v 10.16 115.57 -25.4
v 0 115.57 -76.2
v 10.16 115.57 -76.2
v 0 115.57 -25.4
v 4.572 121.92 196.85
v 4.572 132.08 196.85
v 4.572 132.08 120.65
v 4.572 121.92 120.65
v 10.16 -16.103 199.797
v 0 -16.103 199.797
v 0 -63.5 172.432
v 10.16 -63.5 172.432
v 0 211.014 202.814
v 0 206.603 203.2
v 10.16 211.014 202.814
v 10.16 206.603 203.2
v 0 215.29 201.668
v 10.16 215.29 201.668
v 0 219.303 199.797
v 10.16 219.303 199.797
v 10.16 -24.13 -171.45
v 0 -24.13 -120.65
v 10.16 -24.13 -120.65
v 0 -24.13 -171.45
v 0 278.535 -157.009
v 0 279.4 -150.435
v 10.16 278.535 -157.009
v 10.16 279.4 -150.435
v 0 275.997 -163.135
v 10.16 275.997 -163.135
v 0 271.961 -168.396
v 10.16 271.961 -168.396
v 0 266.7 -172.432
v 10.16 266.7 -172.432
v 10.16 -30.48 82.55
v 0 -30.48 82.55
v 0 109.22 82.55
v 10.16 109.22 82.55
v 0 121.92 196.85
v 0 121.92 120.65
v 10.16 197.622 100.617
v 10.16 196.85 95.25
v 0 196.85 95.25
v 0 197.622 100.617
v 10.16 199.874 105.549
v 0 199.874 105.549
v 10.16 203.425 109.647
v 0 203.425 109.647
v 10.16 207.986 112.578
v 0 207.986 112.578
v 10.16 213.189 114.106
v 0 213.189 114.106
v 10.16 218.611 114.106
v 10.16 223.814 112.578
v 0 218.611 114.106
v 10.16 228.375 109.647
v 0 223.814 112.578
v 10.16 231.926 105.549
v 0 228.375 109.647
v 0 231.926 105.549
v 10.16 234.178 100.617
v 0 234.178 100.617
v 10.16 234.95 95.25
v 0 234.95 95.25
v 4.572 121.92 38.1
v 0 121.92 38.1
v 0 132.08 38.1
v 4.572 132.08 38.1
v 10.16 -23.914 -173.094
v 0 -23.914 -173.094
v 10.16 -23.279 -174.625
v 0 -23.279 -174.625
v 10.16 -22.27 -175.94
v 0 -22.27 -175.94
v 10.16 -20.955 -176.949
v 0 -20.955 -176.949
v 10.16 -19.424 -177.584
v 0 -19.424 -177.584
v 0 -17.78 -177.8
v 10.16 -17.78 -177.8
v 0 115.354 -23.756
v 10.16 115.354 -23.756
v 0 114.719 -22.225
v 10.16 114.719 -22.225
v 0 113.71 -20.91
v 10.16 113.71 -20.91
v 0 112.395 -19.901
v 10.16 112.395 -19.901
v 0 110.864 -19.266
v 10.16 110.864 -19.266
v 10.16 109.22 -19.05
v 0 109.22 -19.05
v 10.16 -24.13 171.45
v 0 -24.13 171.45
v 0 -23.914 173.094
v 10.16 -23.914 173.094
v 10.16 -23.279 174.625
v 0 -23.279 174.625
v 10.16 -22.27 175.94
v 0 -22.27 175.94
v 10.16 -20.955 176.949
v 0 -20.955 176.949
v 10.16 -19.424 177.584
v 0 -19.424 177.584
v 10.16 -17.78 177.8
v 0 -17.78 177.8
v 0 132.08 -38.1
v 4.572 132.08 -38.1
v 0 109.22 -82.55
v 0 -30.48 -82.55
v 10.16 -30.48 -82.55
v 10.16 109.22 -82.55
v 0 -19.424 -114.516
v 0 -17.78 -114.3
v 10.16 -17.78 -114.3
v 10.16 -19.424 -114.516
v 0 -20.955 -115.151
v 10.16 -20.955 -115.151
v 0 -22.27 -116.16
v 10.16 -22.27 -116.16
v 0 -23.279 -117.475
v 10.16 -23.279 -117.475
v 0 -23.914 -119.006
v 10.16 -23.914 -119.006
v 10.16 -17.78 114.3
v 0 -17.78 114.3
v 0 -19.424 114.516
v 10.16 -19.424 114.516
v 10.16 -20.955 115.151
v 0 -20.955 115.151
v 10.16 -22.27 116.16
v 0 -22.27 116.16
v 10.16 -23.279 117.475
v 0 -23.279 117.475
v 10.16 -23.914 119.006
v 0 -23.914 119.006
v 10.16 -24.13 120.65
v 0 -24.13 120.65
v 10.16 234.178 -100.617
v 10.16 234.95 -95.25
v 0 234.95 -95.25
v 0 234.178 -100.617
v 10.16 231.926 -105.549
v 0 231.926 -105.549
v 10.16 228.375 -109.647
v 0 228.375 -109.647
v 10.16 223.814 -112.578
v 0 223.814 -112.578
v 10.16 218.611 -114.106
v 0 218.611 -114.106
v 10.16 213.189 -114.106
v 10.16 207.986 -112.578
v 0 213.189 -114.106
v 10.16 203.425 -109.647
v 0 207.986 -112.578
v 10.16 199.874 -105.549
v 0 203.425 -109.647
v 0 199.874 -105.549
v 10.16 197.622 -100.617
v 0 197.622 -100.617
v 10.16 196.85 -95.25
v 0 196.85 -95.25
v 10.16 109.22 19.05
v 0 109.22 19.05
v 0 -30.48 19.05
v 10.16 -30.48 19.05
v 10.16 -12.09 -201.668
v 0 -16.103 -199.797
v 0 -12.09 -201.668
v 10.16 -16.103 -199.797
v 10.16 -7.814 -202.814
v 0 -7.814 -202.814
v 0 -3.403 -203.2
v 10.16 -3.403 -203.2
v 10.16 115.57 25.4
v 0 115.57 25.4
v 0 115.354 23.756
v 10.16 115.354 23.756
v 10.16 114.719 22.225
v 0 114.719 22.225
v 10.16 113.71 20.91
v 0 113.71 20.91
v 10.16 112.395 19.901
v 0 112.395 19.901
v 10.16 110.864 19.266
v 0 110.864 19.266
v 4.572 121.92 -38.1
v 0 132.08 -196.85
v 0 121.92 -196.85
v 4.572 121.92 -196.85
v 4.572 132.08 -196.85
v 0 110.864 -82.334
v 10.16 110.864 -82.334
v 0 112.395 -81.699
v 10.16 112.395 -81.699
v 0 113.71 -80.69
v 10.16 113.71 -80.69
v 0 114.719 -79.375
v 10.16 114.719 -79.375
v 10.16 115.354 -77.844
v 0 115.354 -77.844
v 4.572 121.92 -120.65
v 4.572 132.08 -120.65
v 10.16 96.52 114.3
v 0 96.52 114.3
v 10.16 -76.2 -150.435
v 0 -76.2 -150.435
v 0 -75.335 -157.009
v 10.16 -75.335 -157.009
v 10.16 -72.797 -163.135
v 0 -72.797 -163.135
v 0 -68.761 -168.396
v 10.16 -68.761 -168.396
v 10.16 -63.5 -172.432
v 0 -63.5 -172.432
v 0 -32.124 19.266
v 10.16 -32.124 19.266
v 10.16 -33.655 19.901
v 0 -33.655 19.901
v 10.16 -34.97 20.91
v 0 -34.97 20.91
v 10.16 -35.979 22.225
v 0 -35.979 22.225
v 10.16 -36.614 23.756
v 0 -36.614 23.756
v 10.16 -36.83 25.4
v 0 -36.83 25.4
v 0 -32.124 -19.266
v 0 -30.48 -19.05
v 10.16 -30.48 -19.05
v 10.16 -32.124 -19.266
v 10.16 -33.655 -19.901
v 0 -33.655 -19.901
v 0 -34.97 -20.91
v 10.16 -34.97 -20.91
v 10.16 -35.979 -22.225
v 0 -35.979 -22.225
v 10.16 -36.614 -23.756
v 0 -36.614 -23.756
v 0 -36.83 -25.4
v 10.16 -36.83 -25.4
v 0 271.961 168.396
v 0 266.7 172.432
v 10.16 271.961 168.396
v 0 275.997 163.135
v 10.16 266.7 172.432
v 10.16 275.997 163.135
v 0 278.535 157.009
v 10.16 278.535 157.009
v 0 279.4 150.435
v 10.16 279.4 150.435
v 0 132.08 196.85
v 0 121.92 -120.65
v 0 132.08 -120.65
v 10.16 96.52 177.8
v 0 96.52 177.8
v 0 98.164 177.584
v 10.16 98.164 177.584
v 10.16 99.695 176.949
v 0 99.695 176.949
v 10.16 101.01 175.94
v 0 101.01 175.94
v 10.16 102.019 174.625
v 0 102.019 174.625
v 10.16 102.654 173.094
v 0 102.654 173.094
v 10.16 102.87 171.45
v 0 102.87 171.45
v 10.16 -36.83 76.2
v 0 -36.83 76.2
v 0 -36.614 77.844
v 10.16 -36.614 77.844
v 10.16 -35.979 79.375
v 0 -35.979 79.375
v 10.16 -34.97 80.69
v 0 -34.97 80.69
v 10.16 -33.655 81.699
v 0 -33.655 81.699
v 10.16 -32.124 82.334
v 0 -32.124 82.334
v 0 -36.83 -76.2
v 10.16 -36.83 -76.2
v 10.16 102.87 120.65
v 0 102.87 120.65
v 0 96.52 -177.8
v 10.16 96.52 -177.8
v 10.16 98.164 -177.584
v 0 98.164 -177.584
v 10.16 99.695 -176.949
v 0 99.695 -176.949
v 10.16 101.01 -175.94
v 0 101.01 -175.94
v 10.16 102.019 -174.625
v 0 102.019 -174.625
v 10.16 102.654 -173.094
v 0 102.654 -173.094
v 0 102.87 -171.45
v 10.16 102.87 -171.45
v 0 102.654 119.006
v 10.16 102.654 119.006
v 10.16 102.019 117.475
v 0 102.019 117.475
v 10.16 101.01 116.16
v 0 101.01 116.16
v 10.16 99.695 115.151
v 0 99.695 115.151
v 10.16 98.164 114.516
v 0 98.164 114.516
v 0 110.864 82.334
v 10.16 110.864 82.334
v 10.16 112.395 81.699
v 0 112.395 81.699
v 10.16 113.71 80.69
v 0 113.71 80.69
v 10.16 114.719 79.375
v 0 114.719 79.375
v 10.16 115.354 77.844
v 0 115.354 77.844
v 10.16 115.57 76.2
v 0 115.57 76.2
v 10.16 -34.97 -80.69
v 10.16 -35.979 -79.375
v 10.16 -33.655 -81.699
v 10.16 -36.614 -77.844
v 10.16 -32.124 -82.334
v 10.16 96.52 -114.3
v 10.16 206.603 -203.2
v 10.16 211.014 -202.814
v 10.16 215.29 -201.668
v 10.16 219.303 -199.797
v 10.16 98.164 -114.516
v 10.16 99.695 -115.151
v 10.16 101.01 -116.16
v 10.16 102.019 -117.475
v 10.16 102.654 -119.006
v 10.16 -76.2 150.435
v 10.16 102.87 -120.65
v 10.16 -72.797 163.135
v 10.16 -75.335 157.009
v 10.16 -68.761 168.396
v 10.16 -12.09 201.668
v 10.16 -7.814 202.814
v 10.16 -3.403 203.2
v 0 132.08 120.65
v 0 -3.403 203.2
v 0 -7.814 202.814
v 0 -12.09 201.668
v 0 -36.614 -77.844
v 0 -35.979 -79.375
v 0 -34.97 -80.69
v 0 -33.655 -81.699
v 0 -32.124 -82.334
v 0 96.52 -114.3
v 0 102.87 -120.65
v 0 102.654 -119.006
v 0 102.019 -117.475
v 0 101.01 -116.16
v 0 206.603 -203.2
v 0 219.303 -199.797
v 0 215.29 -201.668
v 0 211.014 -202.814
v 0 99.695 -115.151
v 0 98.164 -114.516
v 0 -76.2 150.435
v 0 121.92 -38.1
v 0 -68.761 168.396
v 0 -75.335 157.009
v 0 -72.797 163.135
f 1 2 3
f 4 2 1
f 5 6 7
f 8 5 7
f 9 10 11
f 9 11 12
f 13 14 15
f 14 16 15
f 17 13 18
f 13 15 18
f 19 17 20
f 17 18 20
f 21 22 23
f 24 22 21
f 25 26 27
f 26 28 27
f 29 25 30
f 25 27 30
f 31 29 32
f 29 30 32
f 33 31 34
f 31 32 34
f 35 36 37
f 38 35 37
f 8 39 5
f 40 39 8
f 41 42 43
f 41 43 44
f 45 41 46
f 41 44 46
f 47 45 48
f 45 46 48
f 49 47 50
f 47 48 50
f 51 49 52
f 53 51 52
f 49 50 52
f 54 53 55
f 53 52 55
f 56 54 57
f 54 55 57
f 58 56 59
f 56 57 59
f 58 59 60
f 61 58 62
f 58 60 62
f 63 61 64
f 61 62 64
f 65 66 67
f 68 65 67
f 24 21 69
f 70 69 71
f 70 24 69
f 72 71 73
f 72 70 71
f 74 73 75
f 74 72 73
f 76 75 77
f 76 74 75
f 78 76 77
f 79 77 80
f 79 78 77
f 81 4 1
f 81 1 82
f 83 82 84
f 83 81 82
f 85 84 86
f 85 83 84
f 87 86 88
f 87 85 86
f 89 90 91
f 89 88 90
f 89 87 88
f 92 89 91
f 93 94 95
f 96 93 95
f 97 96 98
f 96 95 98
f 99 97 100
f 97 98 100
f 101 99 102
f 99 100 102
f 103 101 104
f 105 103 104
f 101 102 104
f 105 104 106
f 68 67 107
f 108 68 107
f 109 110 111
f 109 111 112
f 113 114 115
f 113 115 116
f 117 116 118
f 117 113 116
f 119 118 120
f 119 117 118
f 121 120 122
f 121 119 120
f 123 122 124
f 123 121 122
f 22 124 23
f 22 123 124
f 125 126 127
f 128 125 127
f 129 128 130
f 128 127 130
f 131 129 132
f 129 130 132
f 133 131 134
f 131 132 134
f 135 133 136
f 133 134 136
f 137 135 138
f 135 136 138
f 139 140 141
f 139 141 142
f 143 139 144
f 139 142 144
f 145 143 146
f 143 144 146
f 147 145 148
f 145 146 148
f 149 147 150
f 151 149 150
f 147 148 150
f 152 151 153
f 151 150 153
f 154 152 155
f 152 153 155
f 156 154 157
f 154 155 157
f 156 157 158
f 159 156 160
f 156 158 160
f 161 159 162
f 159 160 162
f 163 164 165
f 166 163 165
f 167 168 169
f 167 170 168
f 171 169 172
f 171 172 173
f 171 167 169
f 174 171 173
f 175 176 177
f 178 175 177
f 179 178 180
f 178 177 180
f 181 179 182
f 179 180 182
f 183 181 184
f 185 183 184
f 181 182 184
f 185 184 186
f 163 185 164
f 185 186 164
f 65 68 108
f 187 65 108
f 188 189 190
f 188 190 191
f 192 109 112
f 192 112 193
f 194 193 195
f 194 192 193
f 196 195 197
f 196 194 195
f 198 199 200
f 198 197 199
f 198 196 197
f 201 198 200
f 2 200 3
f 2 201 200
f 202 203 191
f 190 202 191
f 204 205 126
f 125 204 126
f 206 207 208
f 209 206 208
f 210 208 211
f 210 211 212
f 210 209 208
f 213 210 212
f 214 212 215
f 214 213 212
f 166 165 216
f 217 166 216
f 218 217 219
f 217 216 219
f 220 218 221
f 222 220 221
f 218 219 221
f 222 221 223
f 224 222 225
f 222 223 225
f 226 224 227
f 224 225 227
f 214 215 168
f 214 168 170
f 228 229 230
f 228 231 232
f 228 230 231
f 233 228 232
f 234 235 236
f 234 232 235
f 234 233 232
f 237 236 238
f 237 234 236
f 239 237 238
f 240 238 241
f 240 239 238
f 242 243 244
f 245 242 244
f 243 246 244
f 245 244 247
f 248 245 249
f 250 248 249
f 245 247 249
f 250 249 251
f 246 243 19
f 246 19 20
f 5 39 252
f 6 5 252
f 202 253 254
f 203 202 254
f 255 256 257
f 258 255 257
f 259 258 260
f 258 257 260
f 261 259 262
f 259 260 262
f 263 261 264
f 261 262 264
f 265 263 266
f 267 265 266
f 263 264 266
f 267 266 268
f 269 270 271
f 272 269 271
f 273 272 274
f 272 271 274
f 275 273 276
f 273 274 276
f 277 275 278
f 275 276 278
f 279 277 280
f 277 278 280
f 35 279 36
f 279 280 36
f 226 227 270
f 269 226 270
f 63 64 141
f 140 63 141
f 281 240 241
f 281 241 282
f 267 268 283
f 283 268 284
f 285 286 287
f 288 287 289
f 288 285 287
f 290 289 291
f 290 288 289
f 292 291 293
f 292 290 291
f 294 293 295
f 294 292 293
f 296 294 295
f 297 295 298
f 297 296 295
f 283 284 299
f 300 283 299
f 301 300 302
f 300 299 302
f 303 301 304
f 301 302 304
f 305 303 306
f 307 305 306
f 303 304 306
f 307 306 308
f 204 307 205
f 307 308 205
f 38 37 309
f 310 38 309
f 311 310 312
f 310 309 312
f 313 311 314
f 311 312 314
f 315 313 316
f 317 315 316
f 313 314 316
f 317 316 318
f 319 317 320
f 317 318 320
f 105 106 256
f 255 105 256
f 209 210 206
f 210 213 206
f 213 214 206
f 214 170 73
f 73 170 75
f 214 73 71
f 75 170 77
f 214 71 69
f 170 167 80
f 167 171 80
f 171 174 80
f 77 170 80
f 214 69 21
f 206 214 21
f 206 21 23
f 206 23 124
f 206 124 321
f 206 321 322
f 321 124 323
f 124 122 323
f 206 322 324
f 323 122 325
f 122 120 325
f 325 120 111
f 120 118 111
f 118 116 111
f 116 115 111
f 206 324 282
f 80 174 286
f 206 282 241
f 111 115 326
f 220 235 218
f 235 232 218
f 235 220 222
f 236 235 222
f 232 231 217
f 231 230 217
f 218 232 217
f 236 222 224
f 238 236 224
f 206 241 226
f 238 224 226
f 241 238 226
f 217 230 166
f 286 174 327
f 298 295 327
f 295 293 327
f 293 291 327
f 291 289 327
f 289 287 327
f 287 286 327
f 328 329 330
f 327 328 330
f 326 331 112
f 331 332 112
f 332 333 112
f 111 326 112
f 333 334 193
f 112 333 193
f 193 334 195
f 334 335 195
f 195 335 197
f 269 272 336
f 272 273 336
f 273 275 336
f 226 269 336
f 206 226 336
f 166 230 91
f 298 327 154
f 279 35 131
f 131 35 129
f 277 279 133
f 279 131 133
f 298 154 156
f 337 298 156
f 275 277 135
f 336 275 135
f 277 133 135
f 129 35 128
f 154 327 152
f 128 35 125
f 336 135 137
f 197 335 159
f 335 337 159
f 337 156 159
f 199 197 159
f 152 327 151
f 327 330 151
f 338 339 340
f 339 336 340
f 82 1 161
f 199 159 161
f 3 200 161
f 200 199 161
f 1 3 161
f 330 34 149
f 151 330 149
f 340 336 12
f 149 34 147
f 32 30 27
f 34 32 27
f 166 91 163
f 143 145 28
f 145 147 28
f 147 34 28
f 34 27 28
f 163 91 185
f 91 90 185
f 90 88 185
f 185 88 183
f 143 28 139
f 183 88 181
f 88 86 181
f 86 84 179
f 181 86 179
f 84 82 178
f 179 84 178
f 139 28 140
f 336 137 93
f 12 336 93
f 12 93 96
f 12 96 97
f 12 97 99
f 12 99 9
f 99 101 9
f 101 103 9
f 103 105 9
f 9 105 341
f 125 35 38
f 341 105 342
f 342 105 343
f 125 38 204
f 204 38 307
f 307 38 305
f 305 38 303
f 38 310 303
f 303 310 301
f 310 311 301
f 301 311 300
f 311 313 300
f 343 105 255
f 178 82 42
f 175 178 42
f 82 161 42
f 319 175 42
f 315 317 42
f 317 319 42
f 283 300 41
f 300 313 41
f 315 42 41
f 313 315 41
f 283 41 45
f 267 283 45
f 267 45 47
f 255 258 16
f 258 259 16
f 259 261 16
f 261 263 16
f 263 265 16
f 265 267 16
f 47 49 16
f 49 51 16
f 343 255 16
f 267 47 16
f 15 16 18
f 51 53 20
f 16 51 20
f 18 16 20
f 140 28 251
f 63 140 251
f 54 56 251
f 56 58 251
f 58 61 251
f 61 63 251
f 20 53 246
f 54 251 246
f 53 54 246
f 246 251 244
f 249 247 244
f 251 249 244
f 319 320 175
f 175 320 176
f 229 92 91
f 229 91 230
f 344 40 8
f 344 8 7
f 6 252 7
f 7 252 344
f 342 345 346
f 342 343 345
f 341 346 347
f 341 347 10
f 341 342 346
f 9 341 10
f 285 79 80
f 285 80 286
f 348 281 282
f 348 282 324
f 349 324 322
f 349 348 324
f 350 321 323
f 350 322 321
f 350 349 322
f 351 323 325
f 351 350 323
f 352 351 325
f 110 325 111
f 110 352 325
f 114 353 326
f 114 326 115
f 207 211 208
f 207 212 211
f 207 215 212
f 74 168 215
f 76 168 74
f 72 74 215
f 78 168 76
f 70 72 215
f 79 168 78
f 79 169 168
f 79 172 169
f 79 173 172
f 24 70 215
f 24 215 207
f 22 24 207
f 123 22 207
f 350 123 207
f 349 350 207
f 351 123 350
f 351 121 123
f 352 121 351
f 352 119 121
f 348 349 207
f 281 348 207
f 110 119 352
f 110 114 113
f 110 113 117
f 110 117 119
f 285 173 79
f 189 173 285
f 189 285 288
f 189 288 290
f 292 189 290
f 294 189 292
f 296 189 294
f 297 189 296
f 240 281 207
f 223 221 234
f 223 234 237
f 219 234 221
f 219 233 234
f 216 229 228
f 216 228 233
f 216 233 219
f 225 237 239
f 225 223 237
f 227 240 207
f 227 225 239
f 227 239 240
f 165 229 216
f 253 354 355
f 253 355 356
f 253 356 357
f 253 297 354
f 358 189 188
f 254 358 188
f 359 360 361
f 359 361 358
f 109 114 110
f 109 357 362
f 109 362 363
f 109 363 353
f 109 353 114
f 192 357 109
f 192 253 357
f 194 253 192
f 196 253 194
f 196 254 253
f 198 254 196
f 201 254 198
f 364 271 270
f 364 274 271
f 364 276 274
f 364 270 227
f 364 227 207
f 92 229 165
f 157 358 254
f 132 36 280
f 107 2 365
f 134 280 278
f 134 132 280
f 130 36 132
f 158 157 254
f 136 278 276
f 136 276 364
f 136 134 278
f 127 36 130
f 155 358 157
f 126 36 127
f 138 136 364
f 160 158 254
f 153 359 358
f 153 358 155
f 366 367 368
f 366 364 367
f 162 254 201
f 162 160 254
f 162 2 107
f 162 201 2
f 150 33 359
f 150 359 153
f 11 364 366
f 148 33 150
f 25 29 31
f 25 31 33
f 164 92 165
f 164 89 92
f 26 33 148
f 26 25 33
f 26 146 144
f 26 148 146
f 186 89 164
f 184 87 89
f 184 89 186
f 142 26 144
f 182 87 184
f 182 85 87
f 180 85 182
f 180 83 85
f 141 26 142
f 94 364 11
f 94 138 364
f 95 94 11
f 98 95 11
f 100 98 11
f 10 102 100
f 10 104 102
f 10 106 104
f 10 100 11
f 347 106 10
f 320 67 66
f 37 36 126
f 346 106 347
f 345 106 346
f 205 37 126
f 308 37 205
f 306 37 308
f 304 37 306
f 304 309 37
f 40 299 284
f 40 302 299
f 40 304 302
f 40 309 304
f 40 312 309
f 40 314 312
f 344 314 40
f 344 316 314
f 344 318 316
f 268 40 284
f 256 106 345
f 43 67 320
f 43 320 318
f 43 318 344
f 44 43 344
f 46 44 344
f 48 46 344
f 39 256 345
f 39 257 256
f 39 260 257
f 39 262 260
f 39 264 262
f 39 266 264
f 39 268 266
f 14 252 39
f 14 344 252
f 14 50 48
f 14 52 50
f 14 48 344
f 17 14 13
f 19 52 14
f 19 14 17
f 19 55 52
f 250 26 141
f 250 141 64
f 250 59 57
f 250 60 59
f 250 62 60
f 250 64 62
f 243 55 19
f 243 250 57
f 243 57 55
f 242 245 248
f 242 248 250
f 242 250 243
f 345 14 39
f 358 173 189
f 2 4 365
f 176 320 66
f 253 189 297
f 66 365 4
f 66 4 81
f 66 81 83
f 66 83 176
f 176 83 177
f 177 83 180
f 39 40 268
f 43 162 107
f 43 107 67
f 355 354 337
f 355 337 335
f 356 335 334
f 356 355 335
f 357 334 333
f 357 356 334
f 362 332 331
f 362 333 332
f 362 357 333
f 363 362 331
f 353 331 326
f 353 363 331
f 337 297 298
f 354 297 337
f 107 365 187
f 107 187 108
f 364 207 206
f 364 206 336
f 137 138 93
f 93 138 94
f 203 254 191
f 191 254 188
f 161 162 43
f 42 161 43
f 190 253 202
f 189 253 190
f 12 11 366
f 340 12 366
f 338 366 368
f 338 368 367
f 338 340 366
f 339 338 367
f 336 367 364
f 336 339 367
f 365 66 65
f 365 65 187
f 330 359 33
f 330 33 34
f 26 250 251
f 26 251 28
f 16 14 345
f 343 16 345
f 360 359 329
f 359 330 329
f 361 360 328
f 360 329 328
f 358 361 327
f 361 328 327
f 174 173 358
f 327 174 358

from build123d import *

# Parameters (mm, degrees)
BOSS_EXTRUDE1_DEPTH   = 10.16
SKETCH2_W             = 76.2
SKETCH2_H             = 10.16
CUT_EXTRUDE1_DEPTH    = 4.572
CHAMFER1_SIZE         = 38.1
CHAMFER1_SIZE2        = 65.991135768
CHAMFER1_PART_2_SIZE  = 38.1
CHAMFER1_PART_2_SIZE2 = 65.991135768
FILLET1_R             = 25.4
CUT_EXTRUDE2_DEPTH    = 26.416


with BuildPart() as part:
    # Sketch1 → Boss-Extrude1 (new body)
    with BuildSketch(Plane(origin=(0, 0, 0), x_dir=(0, 0, -1), z_dir=(1, 0, 0))):
        Polygon((-203.2, 0), (-203.2, 254), (-203.2, 279.4), (203.2, 279.4), (203.2, 254), (203.2, 0), (203.2, -76.2), (-203.2, -76.2), align=None)
        with BuildLine():
            Line((-95.25, 234.95), (95.25, 234.95))
            ThreePointArc((95.25, 234.95), (114.3, 215.9), (95.25, 196.85))
            Line((95.25, 196.85), (-95.25, 196.85))
            ThreePointArc((-95.25, 196.85), (-114.3, 215.9), (-95.25, 234.95))
        make_face(mode=Mode.SUBTRACT)
    extrude(amount=BOSS_EXTRUDE1_DEPTH)

    # Sketch2 → Cut-Extrude1 (cut)
    with BuildSketch(Plane(origin=(0, 0, 0), x_dir=(0, 0, -1), z_dir=(1, 0, 0))):
        with Locations((-158.75, 127)):
            Rectangle(SKETCH2_W, SKETCH2_H)
        with Locations((0, 127)):
            Rectangle(SKETCH2_W, SKETCH2_H)
        with Locations((158.75, 127)):
            Rectangle(SKETCH2_W, SKETCH2_H)
    extrude(amount=CUT_EXTRUDE1_DEPTH, mode=Mode.SUBTRACT)

    # Chamfer1
    chamfer1_edges = [part.edges().sort_by_distance(p)[0] for p in [
        (5.08, 279.4, 203.2),
        (5.08, 279.4, -203.2),
    ]]
    chamfer1_side = [part.faces().sort_by_distance(p)[0] for p in [
        (5.08, 279.4, 0),
    ]]
    chamfer(chamfer1_edges, length=CHAMFER1_SIZE, length2=CHAMFER1_SIZE2, reference=chamfer1_side[0])

    # Chamfer1 part 2
    chamfer1_part_2_edges = [part.edges().sort_by_distance(p)[0] for p in [
        (5.08, -76.2, -203.2),
        (5.08, -76.2, 203.2),
    ]]
    chamfer1_part_2_side = [part.faces().sort_by_distance(p)[0] for p in [
        (5.08, -76.2, 0),
    ]]
    chamfer(chamfer1_part_2_edges, length=CHAMFER1_PART_2_SIZE, length2=CHAMFER1_PART_2_SIZE2, reference=chamfer1_part_2_side[0])

    # Fillet1
    fillet1_edges = [part.edges().sort_by_distance(p)[0] for p in [
        (5.08, 213.408864232, -203.2),
        (5.08, -10.208864232, -203.2),
        (5.08, -76.2, 165.1),
        (5.08, -76.2, -165.1),
        (5.08, 213.408864232, 203.2),
        (5.08, -10.208864232, 203.2),
        (5.08, 279.4, -165.1),
        (5.08, 279.4, 165.1),
    ]]
    fillet(fillet1_edges, radius=FILLET1_R)

    # Sketch4 → Cut-Extrude2 (cut)
    with BuildSketch(Plane(origin=(0, 0, 0), x_dir=(0, 0, -1), z_dir=(1, 0, 0))):
        with BuildLine():
            Line((-171.45, 102.87), (-120.65, 102.87))
            ThreePointArc((-120.65, 102.87), (-116.159871939, 101.010128061), (-114.3, 96.52))
            Line((-114.3, 96.52), (-114.3, -17.78))
            ThreePointArc((-114.3, -17.78), (-116.159871939, -22.270128061), (-120.65, -24.13))
            Line((-120.65, -24.13), (-171.45, -24.13))
            ThreePointArc((-171.45, -24.13), (-175.940128061, -22.270128061), (-177.8, -17.78))
            Line((-177.8, -17.78), (-177.8, 96.52))
            ThreePointArc((-177.8, 96.52), (-175.940128061, 101.010128061), (-171.45, 102.87))
        make_face()
        with BuildLine():
            Line((-76.2, 115.57), (-25.4, 115.57))
            ThreePointArc((-25.4, 115.57), (-20.909871939, 113.710128061), (-19.05, 109.22))
            Line((-19.05, 109.22), (-19.05, -30.48))
            ThreePointArc((-19.05, -30.48), (-20.909871939, -34.970128061), (-25.4, -36.83))
            Line((-25.4, -36.83), (-76.2, -36.83))
            ThreePointArc((-76.2, -36.83), (-80.690128061, -34.970128061), (-82.55, -30.48))
            Line((-82.55, -30.48), (-82.55, 109.22))
            ThreePointArc((-82.55, 109.22), (-80.690128061, 113.710128061), (-76.2, 115.57))
        make_face()
        with BuildLine():
            Line((19.05, 109.22), (19.05, -30.48))
            ThreePointArc((19.05, -30.48), (20.909871939, -34.970128061), (25.4, -36.83))
            Line((25.4, -36.83), (76.2, -36.83))
            ThreePointArc((76.2, -36.83), (80.690128061, -34.970128061), (82.55, -30.48))
            Line((82.55, -30.48), (82.55, 109.22))
            ThreePointArc((82.55, 109.22), (80.690128061, 113.710128061), (76.2, 115.57))
            Line((76.2, 115.57), (25.4, 115.57))
            ThreePointArc((25.4, 115.57), (20.909871939, 113.710128061), (19.05, 109.22))
        make_face()
        with BuildLine():
            Line((114.3, 96.52), (114.3, -17.78))
            ThreePointArc((114.3, -17.78), (116.159871939, -22.270128061), (120.65, -24.13))
            Line((120.65, -24.13), (171.45, -24.13))
            ThreePointArc((171.45, -24.13), (175.940128061, -22.270128061), (177.8, -17.78))
            Line((177.8, -17.78), (177.8, 96.52))
            ThreePointArc((177.8, 96.52), (175.940128061, 101.010128061), (171.45, 102.87))
            Line((171.45, 102.87), (120.65, 102.87))
            ThreePointArc((120.65, 102.87), (116.159871939, 101.010128061), (114.3, 96.52))
        make_face()
    extrude(amount=CUT_EXTRUDE2_DEPTH, mode=Mode.SUBTRACT)


solid = part.part
